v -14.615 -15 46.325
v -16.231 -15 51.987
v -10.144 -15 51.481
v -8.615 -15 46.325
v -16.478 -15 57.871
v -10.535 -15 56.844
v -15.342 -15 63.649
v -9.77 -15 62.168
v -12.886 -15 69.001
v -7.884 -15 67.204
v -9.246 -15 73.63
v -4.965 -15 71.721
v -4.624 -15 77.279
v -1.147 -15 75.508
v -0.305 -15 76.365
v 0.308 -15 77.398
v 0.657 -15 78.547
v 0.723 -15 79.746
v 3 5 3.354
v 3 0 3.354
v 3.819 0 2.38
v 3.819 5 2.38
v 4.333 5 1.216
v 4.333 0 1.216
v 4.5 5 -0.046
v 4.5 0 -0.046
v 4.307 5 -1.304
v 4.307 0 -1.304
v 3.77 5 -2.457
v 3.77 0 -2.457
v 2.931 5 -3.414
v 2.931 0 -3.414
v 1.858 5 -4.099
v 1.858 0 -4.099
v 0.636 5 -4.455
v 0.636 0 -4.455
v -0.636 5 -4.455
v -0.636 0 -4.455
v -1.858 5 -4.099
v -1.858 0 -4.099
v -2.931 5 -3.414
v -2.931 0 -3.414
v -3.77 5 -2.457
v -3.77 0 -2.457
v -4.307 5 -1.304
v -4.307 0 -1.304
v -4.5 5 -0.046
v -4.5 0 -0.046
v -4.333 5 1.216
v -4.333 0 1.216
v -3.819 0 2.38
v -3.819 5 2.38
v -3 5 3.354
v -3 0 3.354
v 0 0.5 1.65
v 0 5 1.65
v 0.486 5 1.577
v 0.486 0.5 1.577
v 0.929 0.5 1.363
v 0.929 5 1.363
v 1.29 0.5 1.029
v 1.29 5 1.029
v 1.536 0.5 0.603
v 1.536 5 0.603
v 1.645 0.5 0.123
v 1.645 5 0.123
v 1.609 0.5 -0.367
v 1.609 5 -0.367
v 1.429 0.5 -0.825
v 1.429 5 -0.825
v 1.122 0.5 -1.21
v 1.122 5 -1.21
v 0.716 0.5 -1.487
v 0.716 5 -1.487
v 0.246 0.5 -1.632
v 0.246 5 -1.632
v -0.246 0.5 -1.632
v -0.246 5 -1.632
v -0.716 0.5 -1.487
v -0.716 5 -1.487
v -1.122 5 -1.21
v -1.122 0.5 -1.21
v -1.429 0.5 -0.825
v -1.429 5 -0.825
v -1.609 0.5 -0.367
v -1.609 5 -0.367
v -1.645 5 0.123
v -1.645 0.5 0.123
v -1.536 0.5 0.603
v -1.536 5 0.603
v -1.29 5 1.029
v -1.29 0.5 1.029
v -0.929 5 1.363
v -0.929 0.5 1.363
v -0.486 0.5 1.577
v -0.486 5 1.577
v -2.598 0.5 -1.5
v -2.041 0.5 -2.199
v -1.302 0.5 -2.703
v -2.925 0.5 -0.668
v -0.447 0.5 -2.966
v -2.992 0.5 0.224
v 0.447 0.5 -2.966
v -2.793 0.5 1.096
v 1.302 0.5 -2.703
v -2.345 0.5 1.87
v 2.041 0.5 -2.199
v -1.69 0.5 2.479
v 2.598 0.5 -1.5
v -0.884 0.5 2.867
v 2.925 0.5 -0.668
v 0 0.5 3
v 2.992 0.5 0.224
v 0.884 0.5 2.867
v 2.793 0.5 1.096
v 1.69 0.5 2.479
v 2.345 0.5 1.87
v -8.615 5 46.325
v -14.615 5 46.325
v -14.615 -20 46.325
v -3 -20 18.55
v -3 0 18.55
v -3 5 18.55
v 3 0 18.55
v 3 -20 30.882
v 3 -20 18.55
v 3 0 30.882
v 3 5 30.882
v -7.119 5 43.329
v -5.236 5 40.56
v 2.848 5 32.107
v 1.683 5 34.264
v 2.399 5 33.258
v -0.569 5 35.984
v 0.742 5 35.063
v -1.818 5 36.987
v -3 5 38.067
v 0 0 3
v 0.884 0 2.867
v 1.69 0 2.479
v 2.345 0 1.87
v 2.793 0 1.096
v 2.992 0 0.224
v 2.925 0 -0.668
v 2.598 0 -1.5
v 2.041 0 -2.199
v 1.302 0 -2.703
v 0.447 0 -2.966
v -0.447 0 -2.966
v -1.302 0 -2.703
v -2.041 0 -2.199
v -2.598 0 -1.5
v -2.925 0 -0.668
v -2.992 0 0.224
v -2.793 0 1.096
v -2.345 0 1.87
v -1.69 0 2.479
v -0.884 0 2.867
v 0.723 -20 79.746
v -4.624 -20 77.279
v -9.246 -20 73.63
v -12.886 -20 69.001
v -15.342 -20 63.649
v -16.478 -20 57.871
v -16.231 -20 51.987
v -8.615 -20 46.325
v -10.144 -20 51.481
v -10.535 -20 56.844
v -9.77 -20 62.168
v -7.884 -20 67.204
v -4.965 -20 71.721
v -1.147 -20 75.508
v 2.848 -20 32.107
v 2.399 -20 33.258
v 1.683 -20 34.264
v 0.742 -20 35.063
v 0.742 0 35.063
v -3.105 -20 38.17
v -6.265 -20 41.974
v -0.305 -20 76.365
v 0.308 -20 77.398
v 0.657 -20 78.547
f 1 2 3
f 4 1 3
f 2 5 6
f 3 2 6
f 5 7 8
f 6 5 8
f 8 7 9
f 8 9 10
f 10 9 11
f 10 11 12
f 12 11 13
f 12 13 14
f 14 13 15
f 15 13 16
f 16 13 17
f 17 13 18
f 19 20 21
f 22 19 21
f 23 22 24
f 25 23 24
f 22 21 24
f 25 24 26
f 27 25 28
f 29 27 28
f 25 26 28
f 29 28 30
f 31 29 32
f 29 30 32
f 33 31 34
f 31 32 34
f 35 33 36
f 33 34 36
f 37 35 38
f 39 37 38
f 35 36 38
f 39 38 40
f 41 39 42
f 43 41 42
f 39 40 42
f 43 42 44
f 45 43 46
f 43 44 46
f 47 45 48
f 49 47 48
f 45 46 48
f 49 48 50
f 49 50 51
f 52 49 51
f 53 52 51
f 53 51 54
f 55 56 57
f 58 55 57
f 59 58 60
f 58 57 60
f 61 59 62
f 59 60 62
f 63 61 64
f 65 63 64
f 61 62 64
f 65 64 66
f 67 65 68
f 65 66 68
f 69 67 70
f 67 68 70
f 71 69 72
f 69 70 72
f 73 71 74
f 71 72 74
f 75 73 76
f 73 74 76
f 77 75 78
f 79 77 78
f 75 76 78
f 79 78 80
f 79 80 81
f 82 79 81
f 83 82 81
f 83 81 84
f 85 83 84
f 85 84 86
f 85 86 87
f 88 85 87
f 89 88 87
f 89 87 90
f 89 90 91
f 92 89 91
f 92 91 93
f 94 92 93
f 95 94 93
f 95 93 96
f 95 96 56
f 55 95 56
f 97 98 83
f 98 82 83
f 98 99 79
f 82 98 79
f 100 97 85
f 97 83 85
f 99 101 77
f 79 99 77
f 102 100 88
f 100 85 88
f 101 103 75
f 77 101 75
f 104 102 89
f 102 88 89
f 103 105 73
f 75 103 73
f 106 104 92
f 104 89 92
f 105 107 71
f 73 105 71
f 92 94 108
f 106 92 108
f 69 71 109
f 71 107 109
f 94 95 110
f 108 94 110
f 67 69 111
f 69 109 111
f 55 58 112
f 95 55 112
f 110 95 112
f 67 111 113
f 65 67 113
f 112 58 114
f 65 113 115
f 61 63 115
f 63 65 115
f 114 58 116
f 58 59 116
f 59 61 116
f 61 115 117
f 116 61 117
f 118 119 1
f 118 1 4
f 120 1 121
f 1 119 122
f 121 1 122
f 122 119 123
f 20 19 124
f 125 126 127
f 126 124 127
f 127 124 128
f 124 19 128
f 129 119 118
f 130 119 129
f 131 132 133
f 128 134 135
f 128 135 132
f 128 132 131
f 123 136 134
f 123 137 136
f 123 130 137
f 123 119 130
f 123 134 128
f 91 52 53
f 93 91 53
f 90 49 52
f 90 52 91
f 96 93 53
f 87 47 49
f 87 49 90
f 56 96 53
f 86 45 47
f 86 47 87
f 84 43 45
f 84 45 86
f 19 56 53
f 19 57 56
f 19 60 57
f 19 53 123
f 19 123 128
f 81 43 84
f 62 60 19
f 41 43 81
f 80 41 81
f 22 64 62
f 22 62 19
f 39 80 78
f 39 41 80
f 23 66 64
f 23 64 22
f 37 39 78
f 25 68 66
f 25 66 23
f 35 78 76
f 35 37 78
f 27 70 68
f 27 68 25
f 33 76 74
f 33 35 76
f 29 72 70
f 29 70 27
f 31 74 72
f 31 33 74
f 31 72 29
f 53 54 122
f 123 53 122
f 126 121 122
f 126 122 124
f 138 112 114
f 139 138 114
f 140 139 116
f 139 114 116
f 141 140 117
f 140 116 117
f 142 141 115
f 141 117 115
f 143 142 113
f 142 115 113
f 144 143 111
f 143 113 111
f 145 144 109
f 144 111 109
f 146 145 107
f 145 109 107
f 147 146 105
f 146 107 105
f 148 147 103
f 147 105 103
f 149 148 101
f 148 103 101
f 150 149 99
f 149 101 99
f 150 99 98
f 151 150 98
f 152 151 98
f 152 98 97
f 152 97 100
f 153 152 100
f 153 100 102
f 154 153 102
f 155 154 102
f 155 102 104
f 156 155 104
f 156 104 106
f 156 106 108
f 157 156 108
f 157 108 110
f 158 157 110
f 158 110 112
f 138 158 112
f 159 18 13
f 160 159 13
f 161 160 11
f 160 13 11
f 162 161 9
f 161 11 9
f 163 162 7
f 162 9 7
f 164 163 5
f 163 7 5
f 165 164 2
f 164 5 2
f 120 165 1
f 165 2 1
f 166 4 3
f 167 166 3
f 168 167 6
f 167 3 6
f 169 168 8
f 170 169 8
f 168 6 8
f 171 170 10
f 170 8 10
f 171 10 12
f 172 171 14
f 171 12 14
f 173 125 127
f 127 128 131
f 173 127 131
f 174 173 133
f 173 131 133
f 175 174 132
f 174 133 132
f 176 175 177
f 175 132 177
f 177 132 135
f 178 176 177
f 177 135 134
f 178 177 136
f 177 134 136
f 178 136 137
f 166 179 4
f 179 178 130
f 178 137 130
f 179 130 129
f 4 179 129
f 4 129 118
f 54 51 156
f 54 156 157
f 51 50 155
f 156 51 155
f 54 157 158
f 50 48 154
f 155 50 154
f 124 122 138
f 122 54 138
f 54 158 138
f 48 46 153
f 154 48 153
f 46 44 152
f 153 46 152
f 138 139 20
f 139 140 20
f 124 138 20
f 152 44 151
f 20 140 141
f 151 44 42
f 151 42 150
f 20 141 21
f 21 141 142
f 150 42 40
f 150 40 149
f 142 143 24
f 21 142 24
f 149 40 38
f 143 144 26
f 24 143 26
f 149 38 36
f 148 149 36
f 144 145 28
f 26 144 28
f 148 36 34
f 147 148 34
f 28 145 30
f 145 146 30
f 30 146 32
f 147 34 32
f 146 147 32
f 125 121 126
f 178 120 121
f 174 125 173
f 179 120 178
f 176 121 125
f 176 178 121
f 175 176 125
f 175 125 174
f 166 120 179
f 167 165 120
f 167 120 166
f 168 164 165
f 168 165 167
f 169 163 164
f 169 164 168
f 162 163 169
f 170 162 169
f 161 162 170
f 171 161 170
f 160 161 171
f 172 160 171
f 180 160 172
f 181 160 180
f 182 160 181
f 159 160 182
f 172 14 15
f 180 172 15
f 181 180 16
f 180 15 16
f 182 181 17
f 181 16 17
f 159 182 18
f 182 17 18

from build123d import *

# Parameters (mm, degrees)
EXTRUDE_2_DEPTH     = 5
SKETCH_4_R          = 1.65
CUT_EXTRUDE_1_DEPTH = 5
EXTRUDE_3_DEPTH     = 5
CUT_EXTRUDE_START   = -4.5
SKETCH_7_R          = 3
CUT_EXTRUDE_2_DEPTH = 3
CUT_EXTRUDE_3_DEPTH = 7.5
EXTRUDE_4_DEPTH     = 5
FILLET_1_R          = 5
FILLET_2_R          = 5
EXTRUDE_5_DEPTH     = 15
EXTRUDE_6_DEPTH     = 5
CUT_EXTRUDE_START_2 = -5
CUT_EXTRUDE_4_DEPTH = 5


with BuildPart() as part:
    # 草图3 → 凸台-拉伸2 (new body)
    with BuildSketch(Plane(origin=(0, 0, 0), x_dir=(1, 0, 0), z_dir=(0, 1, 0))):
        with BuildLine():
            Line((-3, -3.354101966), (-3, -7.416198487))
            Line((-3, -7.416198487), (-3, -43.854101966))
            Line((-3, -43.854101966), (3, -43.854101966))
            Line((3, -43.854101966), (3, -10.583005244))
            Line((3, -10.583005244), (3, -7.416198487))
            Line((3, -7.416198487), (3, -3.354101966))
            ThreePointArc((3, -3.354101966), (0, 4.5), (-3, -3.354101966))
        make_face()
    extrude(amount=EXTRUDE_2_DEPTH)

    # 草图4 → 切除-拉伸1 (cut)
    with BuildSketch(Plane(origin=(0, 5, 0), x_dir=(1, 0, 0), z_dir=(0, 1, 0))):
        with Locations(Location((0, 0, 0), (0, 0, 270))):
            Circle(SKETCH_4_R)
    extrude(amount=-CUT_EXTRUDE_1_DEPTH, mode=Mode.SUBTRACT)

    # 草图6 → 凸台-拉伸3 (add)
    with BuildSketch(Plane(origin=(0, 5, 0), x_dir=(1, 0, 0), z_dir=(0, 1, 0))):
        with BuildLine():
            Line((3, -33.74604712), (-3, -33.74604712))
            ThreePointArc((-3, -33.74604712), (-16.46902092, -57.986607816), (0.722500961, -79.745993902))
            Line((0.722500961, -79.745993902), (1.949520222, -77.620734201))
            ThreePointArc((1.949520222, -77.620734201), (-10.543317179, -55.371702353), (3, -33.74604712))
        make_face()
    extrude(amount=-EXTRUDE_3_DEPTH)

    # 草图7 → 切除-拉伸2 (cut)
    with BuildSketch(Plane(origin=(0, 5, 0), x_dir=(1, 0, 0), z_dir=(0, 1, 0)).offset(CUT_EXTRUDE_START)):
        with Locations(Location((0, 0, 0), (0, 0, 270))):
            Circle(SKETCH_7_R)
    extrude(amount=-CUT_EXTRUDE_2_DEPTH, mode=Mode.SUBTRACT)

    # 草图8 → 切除-拉伸3 (cut)
    with BuildSketch(Plane(origin=(0, 5, 0), x_dir=(1, 0, 0), z_dir=(0, 1, 0))):
        with BuildLine():
            Line((-3, -38.067187498), (-3, -43.854101966))
            Line((-3, -43.854101966), (3, -43.854101966))
            Line((3, -43.854101966), (3, -33.74604712))
            ThreePointArc((3, -33.74604712), (-0.160637142, -35.683569047), (-3, -38.067187498))
        make_face()
    extrude(amount=-CUT_EXTRUDE_3_DEPTH, mode=Mode.SUBTRACT)

    # 草图9 → 凸台-拉伸4 (add)
    with BuildSketch(Plane(origin=(0, 5, 0), x_dir=(1, 0, 0), z_dir=(0, 1, 0))):
        with BuildLine():
            Line((-3, -18.550074543), (-14.614967684, -46.324924269))
            ThreePointArc((-14.614967684, -46.324924269), (-9.917875534, -39.010182445), (-3, -33.74604712))
            Line((-3, -33.74604712), (-3, -18.550074543))
        make_face()
    extrude(amount=-EXTRUDE_4_DEPTH)

    # 圆角1
    fillet_1_edges = [part.edges().sort_by_distance(p)[0] for p in [
        (3, 2.5, 33.74604712),
    ]]
    fillet(fillet_1_edges, radius=FILLET_1_R)

    # 圆角2
    # the kernel refuses this fillet: 5 mm, written as the material it takes off along each edge
    with BuildSketch(Plane(origin=(1.949520222, 14.371610933, 77.620734201), x_dir=(-0.8261015944022844, 0, -0.5635212114250925), z_dir=(0, -1, 0))) as fillet_2_piece_1:
        with BuildLine():
            CenterArc((4.123508811, -4.985927863), FILLET_2_R, 94.299664485, 55.185648669)
            Line((-0.183986354, -2.447131808), (-0.270136257, -2.396355887))
            ThreePointArc((-0.270136257, -2.396355887), (-0.191711734, -1.216068615), (-0.099718557, 0.007497289))
            Line((-0.099718557, 0.007497289), (0.007497289, 0.099718557))
            ThreePointArc((0.007497289, 0.099718557), (1.874322187, 0.029639314), (3.741147084, 0.099718557))
            Line((3.741147084, 0.099718557), (3.748644373, 0))
        make_face()
    extrude(amount=23.743221866, mode=Mode.SUBTRACT)

    # 草图10 → 凸台-拉伸5 (add)
    with BuildSketch(Plane.XZ):
        with BuildLine():
            Line((-3, 18.550074543), (3, 18.550074543))
            Line((3, 18.550074543), (3, 30.881988685))
            ThreePointArc((3, 30.881988685), (2.399314351, 33.25812699), (0.741586704, 35.063340422))
            ThreePointArc((0.741586704, 35.063340422), (-4.779586935, 39.993821756), (-8.614967684, 46.324924269))
            Line((-8.614967684, 46.324924269), (-14.614967684, 46.324924269))
            Line((-14.614967684, 46.324924269), (-3, 18.550074543))
        make_face()
    extrude(amount=EXTRUDE_5_DEPTH)

    # 草图11 → 凸台-拉伸6 (add)
    with BuildSketch(Plane.XZ.offset(15)):
        with BuildLine():
            Line((-14.614967684, 46.324924269), (-3, 18.550074543))
            Line((-3, 18.550074543), (3, 18.550074543))
            Line((3, 18.550074543), (3, 30.881988685))
            ThreePointArc((3, 30.881988685), (2.399314351, 33.25812699), (0.741586704, 35.063340422))
            ThreePointArc((0.741586704, 35.063340422), (-4.779586935, 39.993821756), (-8.614967684, 46.324924269))
            ThreePointArc((-8.614967684, 46.324924269), (-9.770106213, 62.167654699), (-1.147240872, 75.508293582))
            ThreePointArc((-1.147240872, 75.508293582), (0.307928877, 77.397579493), (0.722500961, 79.745993902))
            ThreePointArc((0.722500961, 79.745993902), (-14.272081884, 66.397409294), (-14.614967684, 46.324924269))
        make_face()
    extrude(amount=EXTRUDE_6_DEPTH)

    # 草图12 → 切除-拉伸4 (cut)
    with BuildSketch(Plane.XZ.offset(CUT_EXTRUDE_START_2)):
        with BuildLine():
            Line((-14.614967684, 46.324924269), (-8.614967684, 46.324924269))
            ThreePointArc((-8.614967684, 46.324924269), (-9.770106213, 62.167654699), (-1.147240872, 75.508293582))
            ThreePointArc((-1.147240872, 75.508293582), (0.307928877, 77.397579493), (0.722500961, 79.745993902))
            ThreePointArc((0.722500961, 79.745993902), (-14.272081884, 66.397409294), (-14.614967684, 46.324924269))
        make_face()
    extrude(amount=CUT_EXTRUDE_4_DEPTH, mode=Mode.SUBTRACT)


solid = part.part
